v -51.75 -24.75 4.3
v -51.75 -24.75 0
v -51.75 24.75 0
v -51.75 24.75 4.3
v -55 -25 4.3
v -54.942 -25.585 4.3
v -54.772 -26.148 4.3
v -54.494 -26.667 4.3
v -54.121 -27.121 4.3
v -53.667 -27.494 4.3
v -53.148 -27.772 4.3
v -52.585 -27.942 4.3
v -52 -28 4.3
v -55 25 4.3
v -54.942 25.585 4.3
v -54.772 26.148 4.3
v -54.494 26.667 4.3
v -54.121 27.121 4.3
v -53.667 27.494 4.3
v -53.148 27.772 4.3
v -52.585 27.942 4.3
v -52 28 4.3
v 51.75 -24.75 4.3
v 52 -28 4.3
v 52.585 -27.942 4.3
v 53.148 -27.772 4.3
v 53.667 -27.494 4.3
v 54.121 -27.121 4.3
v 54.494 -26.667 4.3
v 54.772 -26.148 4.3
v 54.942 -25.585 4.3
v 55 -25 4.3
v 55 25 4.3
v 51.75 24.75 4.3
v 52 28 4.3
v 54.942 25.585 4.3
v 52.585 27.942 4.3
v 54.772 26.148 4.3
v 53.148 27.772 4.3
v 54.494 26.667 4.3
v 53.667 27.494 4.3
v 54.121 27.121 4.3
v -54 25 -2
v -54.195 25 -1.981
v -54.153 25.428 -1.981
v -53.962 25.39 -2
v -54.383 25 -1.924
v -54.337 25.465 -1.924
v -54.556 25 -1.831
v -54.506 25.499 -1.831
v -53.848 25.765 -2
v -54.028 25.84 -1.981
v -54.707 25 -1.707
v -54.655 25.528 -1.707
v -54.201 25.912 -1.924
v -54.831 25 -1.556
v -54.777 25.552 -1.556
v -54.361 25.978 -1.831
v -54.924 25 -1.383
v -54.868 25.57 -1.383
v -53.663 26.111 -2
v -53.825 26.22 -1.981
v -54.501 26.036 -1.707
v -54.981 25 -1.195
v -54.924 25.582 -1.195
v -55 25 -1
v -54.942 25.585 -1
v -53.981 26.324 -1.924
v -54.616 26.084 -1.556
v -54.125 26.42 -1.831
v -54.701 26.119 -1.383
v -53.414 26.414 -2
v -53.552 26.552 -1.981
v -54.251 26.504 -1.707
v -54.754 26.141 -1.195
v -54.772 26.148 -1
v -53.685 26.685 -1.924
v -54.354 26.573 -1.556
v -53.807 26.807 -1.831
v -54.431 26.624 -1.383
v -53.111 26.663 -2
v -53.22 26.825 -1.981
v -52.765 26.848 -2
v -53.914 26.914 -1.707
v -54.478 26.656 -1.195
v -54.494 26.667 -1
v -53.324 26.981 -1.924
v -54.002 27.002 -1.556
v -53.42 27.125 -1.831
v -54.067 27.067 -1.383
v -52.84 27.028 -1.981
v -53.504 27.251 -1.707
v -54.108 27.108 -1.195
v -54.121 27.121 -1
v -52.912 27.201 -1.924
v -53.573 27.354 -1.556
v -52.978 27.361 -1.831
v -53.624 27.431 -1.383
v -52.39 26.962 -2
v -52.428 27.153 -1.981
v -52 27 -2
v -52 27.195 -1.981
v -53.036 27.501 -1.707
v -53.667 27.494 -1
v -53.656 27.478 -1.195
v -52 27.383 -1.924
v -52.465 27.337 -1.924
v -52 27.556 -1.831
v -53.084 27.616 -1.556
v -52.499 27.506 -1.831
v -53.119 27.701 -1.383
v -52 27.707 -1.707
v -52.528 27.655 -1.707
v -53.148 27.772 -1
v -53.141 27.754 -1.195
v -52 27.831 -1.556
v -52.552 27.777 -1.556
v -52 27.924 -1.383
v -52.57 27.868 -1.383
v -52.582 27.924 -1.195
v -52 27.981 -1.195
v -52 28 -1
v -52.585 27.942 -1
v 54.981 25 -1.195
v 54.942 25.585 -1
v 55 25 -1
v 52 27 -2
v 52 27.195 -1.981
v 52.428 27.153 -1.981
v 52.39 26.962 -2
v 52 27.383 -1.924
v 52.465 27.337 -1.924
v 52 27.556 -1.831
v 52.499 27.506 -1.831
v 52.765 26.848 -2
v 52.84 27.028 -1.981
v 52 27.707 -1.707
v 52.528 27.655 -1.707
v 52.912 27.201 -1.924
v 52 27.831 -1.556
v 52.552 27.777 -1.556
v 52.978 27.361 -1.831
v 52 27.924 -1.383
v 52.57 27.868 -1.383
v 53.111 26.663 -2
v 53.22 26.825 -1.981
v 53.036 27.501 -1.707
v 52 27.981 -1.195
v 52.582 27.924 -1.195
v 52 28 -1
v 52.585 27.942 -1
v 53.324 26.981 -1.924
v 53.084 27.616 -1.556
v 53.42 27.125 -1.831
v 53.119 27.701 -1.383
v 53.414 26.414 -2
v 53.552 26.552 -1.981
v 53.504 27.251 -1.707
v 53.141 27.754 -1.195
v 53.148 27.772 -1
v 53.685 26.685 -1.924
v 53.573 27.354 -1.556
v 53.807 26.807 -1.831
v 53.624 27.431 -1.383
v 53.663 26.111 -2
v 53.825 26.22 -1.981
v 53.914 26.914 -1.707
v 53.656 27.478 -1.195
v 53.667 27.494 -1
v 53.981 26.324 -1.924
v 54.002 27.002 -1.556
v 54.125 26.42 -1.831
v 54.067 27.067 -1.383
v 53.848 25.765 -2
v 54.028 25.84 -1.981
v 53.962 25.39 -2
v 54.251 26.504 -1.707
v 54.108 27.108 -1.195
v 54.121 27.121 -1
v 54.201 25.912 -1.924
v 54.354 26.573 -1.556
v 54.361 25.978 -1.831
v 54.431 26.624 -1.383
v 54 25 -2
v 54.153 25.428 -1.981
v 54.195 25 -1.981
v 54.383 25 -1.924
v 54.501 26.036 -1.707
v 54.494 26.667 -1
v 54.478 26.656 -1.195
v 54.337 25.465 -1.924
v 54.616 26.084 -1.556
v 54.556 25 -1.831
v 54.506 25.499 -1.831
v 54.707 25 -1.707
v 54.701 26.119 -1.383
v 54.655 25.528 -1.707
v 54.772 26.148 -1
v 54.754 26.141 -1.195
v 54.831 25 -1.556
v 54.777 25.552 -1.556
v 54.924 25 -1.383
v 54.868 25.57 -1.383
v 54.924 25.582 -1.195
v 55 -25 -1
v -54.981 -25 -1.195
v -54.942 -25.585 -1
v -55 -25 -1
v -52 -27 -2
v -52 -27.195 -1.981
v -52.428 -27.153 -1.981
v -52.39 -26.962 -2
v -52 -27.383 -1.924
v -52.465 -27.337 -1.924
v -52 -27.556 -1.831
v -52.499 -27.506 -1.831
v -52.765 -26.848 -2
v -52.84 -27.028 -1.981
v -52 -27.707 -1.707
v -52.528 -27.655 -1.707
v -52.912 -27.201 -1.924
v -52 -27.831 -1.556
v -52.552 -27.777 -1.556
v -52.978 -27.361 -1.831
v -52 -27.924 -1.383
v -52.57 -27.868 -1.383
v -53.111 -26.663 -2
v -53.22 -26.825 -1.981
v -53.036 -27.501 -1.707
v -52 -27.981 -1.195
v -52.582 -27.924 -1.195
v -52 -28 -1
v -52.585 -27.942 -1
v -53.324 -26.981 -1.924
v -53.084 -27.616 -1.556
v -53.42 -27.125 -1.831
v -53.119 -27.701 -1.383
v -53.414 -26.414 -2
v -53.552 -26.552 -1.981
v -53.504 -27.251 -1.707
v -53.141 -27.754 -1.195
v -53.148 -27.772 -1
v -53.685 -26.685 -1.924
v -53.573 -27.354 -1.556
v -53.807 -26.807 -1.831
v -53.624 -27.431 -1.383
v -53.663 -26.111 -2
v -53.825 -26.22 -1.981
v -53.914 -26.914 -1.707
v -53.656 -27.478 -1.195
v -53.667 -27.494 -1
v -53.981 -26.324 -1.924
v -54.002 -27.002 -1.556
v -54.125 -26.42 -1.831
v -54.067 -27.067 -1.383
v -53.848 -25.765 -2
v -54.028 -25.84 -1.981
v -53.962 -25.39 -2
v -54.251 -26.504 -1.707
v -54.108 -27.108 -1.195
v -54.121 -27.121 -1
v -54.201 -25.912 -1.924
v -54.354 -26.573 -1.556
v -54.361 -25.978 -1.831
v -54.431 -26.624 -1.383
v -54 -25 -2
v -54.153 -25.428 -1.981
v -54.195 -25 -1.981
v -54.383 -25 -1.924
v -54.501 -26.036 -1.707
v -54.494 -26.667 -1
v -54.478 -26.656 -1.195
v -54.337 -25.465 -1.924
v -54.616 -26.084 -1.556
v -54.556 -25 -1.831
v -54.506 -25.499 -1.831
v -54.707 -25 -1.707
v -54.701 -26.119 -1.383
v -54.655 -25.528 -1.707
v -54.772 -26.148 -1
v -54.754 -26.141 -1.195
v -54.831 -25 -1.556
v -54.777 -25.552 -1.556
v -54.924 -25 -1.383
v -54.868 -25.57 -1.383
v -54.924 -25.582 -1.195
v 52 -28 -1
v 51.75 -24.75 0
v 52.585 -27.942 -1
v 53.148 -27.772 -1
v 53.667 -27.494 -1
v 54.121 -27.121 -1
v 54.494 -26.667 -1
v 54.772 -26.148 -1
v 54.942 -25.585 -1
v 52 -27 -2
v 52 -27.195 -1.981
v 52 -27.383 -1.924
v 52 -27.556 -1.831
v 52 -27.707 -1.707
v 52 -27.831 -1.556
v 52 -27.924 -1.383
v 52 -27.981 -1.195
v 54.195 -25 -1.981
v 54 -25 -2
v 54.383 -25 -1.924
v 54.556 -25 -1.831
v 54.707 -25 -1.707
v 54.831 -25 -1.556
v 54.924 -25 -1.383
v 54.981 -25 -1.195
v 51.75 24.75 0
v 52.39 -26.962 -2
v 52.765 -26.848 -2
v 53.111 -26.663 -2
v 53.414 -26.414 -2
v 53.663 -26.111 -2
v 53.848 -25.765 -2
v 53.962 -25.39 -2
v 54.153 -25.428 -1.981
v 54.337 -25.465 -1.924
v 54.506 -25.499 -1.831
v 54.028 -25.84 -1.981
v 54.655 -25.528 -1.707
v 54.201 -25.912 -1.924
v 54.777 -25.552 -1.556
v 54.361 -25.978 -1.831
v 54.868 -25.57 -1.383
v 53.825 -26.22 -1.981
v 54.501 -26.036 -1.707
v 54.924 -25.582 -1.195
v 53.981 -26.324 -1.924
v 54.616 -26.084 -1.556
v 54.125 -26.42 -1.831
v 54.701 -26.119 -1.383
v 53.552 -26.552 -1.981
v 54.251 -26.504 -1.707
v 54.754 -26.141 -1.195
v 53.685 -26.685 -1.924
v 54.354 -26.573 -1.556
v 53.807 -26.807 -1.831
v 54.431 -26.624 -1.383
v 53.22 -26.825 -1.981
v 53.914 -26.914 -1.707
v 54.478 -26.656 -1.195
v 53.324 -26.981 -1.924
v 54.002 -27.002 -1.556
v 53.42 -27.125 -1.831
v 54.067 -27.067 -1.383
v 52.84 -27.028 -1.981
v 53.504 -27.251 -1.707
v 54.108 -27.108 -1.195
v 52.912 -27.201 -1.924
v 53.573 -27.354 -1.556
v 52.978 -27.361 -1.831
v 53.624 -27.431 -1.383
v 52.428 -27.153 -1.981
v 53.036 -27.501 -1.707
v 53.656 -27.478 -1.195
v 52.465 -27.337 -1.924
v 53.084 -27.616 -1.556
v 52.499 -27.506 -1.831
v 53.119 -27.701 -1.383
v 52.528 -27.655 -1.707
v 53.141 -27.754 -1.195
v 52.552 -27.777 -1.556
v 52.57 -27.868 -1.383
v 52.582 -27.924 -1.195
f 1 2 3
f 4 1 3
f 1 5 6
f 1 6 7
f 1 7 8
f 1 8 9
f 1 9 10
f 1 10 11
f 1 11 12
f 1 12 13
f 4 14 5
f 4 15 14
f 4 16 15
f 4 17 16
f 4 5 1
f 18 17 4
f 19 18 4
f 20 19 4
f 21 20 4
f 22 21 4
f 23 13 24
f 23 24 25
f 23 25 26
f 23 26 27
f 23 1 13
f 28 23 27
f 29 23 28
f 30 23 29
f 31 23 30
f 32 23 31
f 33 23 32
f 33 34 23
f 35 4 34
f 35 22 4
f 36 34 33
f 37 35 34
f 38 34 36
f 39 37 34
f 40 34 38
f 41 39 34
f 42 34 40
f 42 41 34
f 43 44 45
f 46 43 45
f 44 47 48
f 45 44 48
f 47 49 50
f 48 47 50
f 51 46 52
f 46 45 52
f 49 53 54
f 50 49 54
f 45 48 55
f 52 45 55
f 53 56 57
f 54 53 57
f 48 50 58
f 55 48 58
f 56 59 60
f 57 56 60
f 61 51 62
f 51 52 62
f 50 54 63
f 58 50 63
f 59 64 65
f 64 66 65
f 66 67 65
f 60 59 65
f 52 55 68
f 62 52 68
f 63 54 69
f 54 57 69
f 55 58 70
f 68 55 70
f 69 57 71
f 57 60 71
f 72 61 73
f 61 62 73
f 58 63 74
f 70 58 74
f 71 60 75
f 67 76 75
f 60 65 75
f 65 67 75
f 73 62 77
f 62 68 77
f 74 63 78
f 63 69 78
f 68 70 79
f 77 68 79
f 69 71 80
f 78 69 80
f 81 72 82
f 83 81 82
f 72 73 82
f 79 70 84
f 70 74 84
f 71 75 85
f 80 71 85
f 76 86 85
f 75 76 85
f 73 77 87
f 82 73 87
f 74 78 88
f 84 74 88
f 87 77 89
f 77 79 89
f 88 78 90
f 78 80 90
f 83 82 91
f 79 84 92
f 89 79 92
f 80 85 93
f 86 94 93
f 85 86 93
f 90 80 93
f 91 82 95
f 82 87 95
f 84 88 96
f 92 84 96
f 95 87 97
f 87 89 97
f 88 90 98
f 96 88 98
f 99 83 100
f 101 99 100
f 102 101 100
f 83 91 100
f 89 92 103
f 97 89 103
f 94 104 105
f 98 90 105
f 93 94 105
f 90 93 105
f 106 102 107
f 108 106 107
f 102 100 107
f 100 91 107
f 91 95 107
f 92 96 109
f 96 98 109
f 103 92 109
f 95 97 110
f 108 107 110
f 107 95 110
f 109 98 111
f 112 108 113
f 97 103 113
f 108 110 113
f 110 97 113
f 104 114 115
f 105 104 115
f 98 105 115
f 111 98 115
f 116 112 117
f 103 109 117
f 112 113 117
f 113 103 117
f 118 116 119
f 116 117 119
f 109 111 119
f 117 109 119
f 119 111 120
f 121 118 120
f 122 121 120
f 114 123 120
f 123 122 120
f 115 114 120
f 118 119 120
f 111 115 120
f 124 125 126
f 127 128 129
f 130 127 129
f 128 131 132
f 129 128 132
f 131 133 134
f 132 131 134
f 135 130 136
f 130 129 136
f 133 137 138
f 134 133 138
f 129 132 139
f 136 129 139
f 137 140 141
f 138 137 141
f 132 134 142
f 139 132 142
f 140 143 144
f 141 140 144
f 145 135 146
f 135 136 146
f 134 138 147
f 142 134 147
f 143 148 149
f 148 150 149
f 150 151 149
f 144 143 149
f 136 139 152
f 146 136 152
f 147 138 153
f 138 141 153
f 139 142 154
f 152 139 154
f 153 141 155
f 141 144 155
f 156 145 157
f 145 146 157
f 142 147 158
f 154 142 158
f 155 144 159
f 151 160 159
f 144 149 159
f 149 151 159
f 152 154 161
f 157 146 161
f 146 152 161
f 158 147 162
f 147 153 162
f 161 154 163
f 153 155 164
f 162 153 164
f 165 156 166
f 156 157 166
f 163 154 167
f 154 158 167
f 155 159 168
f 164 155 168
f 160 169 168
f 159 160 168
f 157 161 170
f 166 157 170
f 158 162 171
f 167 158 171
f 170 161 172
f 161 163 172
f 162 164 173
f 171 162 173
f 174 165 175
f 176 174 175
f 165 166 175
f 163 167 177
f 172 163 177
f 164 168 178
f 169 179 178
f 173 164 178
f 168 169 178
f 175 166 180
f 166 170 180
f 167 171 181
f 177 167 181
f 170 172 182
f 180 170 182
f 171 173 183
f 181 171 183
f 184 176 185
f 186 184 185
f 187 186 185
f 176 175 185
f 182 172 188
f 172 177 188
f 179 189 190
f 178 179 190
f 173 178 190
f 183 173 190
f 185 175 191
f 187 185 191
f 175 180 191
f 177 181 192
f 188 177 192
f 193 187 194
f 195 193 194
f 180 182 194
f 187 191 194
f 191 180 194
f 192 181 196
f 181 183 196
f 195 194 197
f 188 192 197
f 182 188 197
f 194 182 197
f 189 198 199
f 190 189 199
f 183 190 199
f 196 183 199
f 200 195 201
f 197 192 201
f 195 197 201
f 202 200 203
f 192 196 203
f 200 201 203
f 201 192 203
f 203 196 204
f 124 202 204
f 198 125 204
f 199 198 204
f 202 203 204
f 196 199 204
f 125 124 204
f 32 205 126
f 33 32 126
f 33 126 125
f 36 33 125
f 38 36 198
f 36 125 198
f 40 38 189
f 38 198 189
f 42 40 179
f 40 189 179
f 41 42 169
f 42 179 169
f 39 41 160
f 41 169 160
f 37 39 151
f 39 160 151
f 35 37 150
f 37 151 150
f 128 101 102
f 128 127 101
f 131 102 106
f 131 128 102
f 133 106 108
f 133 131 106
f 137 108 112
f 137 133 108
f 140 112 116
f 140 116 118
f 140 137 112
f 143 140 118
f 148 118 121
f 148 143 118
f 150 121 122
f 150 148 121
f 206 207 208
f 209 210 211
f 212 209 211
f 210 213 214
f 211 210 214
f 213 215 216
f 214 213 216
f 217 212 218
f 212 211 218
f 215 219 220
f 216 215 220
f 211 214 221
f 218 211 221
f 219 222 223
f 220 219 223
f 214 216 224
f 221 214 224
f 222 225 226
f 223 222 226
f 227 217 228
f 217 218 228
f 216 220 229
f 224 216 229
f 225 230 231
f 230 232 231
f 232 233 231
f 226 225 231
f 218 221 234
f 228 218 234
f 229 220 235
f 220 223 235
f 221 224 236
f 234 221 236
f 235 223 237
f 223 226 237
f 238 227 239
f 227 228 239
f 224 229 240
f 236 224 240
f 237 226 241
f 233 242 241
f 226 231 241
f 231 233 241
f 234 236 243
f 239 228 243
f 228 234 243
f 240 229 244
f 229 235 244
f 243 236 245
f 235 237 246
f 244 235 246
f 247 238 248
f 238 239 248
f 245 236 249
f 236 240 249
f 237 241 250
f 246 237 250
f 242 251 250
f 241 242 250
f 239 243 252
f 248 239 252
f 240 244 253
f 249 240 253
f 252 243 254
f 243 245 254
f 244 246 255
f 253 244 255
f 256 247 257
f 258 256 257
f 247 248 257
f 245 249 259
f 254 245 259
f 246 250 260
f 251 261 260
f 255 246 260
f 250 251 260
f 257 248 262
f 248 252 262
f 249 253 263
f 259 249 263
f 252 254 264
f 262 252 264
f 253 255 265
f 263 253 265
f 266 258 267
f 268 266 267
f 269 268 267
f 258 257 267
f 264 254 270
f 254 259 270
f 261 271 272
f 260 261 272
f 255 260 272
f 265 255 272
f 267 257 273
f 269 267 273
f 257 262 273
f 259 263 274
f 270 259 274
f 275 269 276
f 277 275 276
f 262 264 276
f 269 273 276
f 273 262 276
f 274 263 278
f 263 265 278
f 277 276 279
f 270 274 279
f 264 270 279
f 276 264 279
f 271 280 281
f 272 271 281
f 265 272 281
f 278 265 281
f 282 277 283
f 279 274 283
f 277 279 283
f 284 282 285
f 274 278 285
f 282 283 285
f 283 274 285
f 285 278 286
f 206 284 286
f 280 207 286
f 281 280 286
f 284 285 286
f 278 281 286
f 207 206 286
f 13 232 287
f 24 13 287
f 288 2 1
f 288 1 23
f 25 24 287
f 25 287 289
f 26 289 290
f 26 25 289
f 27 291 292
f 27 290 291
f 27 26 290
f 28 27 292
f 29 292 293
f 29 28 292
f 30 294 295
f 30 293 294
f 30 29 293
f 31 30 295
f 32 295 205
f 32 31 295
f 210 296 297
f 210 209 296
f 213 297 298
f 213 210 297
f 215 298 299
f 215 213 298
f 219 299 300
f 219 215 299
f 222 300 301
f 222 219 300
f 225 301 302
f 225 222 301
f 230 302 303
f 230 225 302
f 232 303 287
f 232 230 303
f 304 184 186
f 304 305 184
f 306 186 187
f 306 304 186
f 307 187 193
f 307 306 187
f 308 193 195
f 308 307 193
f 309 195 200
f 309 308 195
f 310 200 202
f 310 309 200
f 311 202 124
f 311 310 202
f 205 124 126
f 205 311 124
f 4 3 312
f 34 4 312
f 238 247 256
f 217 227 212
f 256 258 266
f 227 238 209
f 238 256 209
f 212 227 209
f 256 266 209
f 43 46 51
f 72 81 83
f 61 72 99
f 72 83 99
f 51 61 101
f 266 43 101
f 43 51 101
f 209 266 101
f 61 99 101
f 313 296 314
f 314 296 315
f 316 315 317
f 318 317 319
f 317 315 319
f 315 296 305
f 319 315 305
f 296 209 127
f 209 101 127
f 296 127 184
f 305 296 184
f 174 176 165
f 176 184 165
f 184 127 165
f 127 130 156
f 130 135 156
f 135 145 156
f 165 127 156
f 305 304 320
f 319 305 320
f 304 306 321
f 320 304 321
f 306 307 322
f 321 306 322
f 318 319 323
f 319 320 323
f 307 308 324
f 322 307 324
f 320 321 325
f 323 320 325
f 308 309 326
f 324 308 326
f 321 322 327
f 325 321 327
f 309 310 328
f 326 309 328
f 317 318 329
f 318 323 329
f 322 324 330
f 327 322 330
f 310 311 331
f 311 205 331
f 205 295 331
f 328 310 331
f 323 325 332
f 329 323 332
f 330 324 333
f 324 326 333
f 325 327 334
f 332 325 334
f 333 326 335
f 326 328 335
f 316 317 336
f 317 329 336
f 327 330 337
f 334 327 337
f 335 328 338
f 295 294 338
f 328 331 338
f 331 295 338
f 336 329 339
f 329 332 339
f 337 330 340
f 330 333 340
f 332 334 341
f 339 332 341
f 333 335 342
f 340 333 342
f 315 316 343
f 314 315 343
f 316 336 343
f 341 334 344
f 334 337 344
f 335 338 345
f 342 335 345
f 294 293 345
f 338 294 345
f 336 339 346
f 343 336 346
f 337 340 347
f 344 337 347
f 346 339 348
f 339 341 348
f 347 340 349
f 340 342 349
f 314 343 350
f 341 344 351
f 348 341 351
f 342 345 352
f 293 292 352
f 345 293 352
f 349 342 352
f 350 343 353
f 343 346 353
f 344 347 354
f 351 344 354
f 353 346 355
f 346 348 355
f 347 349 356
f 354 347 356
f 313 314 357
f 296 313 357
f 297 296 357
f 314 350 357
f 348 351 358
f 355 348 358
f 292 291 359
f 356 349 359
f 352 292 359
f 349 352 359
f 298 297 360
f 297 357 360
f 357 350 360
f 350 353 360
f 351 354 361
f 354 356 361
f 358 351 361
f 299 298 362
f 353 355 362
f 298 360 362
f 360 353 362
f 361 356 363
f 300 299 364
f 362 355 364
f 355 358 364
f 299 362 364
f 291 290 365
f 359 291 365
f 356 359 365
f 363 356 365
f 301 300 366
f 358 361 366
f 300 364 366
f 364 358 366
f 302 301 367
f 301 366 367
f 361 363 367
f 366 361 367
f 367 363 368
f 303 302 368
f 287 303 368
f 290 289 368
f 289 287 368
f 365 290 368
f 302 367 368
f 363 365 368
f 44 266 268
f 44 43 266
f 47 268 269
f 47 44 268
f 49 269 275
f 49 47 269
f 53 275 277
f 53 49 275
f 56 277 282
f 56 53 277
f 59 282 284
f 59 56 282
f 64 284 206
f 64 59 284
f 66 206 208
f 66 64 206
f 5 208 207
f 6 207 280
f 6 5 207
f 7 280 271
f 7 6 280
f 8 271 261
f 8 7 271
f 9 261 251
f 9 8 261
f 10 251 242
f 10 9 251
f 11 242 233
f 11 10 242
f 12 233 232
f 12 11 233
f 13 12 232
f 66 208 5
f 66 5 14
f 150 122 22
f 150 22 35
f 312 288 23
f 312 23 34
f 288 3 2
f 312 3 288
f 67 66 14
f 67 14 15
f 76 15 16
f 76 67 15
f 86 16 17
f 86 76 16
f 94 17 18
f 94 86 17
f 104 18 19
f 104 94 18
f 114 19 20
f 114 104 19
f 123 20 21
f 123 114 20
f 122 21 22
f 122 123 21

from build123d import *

# Parameters (mm, degrees)
F4_W     = 110
F4_H     = 56
F4_W_2   = 103.5
F4_H_2   = 49.5
F5_DEPTH = 2
F6_DEPTH = 4.3
F7_R     = 3
F8_R     = 1


with BuildPart() as f5:
    # F4 (on Top) → F5 (new body)
    with BuildSketch(Plane.XY):
        Rectangle(F4_W, F4_H)
        Rectangle(F4_W_2, F4_H_2, mode=Mode.SUBTRACT)
        Rectangle(F4_W_2, F4_H_2)
    extrude(amount=-F5_DEPTH)

    # F4 (on Top) → F6 (join)
    with BuildSketch(Plane.XY):
        Rectangle(F4_W, F4_H)
        Rectangle(F4_W_2, F4_H_2, mode=Mode.SUBTRACT)
    extrude(amount=F6_DEPTH)

    # F7
    f7_edges = [f5.edges().sort_by_distance(p)[0] for p in [
        (-55, -28, 1.15),
        (55, -28, 1.15),
        (55, 28, 1.15),
        (-55, 28, 1.15),
    ]]
    fillet(f7_edges, radius=F7_R)

    # F8
    f8_edges = [f5.edges().sort_by_distance(p)[0] for p in [
        (0, 28, -2),
        (54.12132, 27.12132, -2),
        (-54.12132, 27.12132, -2),
        (55, 0, -2),
        (-55, 0, -2),
        (54.12132, -27.12132, -2),
        (-54.12132, -27.12132, -2),
        (0, -28, -2),
    ]]
    fillet(f8_edges, radius=F8_R)


solid = f5.part
